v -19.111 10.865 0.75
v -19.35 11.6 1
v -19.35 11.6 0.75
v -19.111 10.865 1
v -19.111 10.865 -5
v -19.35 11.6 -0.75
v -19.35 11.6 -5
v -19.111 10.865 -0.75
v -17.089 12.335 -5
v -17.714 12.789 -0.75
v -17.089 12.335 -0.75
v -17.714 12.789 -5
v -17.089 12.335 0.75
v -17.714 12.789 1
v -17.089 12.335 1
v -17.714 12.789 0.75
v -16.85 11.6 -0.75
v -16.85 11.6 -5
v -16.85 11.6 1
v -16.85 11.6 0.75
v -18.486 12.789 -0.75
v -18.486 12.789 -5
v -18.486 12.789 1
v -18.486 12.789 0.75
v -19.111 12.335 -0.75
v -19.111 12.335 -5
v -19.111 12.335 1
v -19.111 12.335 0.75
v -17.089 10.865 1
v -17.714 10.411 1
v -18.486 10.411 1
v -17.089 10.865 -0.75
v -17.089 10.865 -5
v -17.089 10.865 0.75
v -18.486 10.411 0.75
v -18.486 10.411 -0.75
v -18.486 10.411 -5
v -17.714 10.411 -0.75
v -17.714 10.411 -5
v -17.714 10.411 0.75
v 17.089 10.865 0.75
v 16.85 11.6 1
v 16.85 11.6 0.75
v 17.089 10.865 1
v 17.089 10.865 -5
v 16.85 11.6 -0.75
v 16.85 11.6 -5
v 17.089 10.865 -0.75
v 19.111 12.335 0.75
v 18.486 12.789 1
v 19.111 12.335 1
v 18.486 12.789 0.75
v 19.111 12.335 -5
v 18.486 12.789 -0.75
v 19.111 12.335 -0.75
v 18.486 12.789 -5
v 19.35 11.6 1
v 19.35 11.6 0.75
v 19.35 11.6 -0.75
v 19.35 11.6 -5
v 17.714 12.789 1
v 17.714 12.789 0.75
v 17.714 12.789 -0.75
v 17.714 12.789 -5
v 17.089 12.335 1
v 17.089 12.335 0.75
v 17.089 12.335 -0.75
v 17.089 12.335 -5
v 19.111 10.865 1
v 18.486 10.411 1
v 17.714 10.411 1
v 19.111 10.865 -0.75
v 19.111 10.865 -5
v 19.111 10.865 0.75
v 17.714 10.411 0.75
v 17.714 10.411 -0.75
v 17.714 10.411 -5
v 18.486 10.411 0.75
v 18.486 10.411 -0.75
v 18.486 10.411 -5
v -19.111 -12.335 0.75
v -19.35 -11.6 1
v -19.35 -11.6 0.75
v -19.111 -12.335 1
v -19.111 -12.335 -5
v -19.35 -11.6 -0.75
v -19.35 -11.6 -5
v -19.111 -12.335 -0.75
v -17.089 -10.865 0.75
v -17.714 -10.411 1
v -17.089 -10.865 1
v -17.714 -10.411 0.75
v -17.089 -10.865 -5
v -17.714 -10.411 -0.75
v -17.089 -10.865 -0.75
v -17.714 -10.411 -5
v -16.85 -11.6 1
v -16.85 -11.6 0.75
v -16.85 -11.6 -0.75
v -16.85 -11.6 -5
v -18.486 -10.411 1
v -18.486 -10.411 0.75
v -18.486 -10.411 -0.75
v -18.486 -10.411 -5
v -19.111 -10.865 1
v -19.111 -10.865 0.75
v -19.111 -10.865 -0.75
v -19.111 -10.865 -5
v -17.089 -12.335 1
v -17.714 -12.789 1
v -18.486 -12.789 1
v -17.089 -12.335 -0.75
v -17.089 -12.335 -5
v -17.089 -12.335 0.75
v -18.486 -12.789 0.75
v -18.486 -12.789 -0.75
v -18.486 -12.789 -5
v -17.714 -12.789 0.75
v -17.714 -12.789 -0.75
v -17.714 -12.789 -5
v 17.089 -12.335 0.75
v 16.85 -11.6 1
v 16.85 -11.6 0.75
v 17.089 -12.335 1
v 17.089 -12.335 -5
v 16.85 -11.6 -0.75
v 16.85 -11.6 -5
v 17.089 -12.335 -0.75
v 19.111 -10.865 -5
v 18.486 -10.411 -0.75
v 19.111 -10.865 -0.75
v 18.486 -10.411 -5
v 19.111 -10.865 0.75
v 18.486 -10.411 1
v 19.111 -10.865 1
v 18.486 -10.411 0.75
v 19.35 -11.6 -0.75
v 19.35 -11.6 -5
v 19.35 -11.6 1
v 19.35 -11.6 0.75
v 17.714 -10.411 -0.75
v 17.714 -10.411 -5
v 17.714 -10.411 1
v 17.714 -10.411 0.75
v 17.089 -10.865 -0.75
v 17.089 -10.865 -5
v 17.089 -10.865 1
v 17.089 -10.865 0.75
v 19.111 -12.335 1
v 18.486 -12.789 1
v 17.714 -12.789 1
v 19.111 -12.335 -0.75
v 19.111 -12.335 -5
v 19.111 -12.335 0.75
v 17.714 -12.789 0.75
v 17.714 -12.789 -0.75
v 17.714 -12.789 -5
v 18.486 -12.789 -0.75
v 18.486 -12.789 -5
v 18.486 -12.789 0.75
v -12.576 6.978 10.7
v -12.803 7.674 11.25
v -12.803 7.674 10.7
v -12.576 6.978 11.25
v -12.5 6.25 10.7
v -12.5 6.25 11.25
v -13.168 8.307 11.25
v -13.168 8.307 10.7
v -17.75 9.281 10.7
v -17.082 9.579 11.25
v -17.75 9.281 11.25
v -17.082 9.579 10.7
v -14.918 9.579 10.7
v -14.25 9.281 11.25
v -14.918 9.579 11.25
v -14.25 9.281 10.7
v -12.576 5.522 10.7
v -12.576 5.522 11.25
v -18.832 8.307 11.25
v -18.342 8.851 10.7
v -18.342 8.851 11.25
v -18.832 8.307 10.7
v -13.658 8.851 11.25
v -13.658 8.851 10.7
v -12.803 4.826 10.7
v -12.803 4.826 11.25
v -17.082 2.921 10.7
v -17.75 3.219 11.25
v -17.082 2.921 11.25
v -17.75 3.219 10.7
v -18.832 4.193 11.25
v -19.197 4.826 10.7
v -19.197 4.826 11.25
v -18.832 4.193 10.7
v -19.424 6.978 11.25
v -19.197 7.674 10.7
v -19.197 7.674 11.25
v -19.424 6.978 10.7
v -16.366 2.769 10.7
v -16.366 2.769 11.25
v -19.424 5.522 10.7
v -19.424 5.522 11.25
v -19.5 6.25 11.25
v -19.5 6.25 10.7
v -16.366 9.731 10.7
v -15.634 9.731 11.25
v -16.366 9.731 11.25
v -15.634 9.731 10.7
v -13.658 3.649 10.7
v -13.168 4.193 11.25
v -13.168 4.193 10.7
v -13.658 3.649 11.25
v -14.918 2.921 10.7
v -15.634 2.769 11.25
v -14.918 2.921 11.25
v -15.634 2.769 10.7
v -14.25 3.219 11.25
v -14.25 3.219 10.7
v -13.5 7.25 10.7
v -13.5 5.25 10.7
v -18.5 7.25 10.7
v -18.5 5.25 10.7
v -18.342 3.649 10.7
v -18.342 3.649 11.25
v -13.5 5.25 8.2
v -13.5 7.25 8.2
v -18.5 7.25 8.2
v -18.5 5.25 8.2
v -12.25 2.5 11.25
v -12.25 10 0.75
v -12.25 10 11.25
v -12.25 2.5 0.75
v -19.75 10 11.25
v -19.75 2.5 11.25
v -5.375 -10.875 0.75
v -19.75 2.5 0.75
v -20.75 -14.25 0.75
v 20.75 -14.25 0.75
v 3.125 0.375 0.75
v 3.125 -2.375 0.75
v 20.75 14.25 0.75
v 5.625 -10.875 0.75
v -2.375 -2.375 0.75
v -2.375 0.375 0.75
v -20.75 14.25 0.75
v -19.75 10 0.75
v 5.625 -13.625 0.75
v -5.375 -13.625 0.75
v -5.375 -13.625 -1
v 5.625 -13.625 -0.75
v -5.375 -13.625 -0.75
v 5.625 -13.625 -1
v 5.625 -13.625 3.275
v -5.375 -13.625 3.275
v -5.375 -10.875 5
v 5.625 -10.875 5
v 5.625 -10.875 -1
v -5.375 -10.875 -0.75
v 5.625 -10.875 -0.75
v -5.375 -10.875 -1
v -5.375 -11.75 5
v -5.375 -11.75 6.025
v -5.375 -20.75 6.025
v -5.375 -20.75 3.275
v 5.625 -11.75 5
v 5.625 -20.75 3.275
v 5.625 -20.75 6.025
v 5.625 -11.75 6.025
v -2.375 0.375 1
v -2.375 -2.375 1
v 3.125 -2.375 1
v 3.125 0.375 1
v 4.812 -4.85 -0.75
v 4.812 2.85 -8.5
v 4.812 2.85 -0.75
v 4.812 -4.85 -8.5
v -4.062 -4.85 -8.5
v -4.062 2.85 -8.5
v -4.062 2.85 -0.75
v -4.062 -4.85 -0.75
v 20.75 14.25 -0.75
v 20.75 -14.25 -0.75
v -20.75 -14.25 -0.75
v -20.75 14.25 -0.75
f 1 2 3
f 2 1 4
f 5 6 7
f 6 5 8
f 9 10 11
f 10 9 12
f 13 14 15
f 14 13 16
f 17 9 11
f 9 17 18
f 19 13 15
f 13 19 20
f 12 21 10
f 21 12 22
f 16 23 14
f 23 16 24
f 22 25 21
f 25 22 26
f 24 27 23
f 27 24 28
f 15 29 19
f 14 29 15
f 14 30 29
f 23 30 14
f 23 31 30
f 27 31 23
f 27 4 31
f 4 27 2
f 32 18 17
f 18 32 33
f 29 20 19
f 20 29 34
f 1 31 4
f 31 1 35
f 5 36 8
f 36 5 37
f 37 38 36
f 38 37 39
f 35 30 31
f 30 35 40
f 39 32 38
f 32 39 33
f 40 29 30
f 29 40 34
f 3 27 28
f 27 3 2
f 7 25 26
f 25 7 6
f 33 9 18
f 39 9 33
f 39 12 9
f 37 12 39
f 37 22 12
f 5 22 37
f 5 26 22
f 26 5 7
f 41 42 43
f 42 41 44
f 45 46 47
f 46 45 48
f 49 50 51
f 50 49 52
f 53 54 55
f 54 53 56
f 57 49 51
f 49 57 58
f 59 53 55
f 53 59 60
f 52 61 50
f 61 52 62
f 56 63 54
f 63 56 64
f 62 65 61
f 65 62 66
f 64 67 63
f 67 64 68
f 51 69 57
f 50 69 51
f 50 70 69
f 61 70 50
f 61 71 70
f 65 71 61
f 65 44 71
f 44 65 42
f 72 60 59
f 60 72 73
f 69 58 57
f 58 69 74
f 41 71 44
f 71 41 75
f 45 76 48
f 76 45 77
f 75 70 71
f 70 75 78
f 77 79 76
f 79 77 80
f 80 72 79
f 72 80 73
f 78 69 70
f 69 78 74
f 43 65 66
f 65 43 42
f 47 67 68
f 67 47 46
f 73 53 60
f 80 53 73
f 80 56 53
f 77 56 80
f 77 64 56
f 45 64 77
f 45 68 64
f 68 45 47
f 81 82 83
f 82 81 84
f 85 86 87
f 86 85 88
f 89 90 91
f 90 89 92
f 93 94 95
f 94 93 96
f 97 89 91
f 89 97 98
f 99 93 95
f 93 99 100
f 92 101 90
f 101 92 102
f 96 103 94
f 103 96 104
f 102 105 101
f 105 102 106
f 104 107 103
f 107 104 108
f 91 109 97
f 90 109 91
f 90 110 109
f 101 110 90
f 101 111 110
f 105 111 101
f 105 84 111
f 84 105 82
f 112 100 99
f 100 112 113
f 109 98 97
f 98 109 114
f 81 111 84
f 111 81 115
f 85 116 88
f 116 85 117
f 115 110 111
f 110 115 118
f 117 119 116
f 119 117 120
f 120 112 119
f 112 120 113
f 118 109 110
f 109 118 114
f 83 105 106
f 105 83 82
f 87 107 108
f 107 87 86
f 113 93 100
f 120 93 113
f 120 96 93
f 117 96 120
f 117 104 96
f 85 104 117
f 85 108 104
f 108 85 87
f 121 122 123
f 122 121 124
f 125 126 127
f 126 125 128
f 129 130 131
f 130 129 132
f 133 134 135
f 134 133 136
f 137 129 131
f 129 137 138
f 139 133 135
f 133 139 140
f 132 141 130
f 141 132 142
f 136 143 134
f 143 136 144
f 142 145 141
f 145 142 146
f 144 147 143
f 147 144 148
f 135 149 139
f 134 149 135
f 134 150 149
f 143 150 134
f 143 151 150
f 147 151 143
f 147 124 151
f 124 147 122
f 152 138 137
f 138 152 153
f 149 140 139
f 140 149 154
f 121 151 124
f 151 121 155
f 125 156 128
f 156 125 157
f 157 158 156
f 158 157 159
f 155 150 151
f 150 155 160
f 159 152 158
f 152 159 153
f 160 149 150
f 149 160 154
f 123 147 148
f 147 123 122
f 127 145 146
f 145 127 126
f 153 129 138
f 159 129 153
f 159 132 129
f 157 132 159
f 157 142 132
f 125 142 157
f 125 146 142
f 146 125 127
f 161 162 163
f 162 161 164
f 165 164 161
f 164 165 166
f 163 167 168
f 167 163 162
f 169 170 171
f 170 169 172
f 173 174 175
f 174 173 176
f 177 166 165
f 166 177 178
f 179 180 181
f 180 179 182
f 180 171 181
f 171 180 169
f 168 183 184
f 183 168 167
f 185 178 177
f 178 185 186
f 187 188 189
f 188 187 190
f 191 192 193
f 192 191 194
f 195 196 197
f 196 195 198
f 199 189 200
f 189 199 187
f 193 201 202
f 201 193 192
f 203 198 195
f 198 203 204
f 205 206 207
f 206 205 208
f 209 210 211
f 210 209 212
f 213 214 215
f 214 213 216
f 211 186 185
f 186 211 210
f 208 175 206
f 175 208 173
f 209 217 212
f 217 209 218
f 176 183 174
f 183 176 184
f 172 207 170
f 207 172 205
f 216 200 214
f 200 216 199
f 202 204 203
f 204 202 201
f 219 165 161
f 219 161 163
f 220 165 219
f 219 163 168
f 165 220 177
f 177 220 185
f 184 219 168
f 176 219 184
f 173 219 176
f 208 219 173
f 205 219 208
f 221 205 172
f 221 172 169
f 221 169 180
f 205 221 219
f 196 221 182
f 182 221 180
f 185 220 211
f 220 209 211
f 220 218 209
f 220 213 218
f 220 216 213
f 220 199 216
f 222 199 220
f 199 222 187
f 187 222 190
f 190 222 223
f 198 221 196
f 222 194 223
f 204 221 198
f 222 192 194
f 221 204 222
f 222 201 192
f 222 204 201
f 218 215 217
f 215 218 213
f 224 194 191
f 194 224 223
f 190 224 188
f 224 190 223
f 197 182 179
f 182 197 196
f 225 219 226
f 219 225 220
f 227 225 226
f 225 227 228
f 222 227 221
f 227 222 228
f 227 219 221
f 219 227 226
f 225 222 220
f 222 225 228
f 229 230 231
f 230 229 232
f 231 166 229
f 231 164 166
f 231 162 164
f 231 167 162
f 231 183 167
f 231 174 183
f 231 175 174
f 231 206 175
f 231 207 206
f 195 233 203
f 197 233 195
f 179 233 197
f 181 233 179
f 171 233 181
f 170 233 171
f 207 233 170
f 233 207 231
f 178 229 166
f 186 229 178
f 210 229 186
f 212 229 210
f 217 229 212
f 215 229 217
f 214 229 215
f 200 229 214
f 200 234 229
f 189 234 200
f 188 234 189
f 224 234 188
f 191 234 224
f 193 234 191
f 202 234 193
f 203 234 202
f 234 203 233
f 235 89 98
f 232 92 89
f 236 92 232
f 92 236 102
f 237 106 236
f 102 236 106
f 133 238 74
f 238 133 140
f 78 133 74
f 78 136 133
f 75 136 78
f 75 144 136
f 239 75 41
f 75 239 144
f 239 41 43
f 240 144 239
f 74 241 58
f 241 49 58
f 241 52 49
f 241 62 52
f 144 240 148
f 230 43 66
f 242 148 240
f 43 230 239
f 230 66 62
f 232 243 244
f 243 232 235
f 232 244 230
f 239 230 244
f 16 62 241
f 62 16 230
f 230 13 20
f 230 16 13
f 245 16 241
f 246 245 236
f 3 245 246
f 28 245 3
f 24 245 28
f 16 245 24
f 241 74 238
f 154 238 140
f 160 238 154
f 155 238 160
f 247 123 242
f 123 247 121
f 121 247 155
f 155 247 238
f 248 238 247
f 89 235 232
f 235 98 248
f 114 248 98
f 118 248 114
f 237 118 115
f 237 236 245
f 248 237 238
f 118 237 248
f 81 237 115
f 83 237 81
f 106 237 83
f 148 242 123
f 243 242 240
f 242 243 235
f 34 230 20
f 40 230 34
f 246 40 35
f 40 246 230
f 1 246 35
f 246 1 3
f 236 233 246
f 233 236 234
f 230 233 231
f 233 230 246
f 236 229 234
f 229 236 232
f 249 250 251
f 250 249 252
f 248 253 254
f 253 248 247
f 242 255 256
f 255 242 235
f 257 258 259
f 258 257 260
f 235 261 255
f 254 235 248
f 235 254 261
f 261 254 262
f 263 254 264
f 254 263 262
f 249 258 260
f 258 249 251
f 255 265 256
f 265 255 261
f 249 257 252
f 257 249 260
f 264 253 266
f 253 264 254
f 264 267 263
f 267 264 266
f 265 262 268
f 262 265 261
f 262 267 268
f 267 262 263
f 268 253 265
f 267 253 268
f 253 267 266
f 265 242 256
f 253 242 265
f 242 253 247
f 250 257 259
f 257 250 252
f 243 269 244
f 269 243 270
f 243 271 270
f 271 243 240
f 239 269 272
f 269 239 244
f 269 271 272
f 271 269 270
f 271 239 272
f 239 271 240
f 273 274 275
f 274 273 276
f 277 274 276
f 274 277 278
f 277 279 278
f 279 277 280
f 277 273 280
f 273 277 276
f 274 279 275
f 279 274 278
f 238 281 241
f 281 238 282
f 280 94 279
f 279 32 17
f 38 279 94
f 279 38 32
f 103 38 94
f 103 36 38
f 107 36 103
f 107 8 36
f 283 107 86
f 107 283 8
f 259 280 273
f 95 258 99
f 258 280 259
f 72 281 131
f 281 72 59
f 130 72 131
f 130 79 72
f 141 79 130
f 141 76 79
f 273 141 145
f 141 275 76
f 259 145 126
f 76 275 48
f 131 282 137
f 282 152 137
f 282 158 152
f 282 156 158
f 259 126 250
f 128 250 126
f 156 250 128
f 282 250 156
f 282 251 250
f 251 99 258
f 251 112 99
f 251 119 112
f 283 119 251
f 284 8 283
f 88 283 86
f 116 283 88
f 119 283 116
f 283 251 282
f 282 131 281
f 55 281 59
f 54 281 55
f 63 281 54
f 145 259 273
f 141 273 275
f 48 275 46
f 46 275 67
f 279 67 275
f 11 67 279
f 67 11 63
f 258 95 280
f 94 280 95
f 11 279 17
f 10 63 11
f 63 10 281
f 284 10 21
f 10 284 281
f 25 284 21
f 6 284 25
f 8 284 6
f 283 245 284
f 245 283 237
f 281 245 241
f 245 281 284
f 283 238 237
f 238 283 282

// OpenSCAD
// file: pcb_connector.scad
pin(len = 8, angle = 90, mask = 0);
translate([-10,0,0])pinrow(num = 4,len = 8, angle = 90, mask = 0);

translate([12,0,0])xh2_54f(num = 4, mask = 0);
translate([0,20,0])
{
pin(len = 8, angle = 90, mask = 1);
translate([-10,0,0])pinrow(num = 4,len = 8, angle = 90, mask = 1);

translate([12,0,0])xh2_54f(num = 4, mask = 1);
}
module pin(len = 7, angle = 0, mask = 0)
{
  pins = (mask == 0)? 0.70: 2.75;
  cube([2.75,2.75,3], center = true); //plastic cube
  cube([pins,pins,6], center = true); //transverse
  translate([(angle != 0)?len/2*sin(angle):0,0,(angle != 0)?len/2*cos(angle)-0.35+3:3])
    rotate([0,angle,0])
    cube([pins,pins,len+mask], center = true); //transverse

}

module pinrow(num = 4,len = 7, angle = 0, mask = 0)
{
  for(y =  [0:num-1])
    translate([0,y*2.75,0])pin(len,angle, mask = mask);
}
module xh2_54f(num = 4, mask = 0)
{
  for(x =  [0:num-1])
    translate([x*2.75,0,0])pin(len = 3.5, mask = mask);
  translate([num*2.75/2-2.75/2,0,2+mask/2])
  {
    difference()
    {
      cube([(num+0.5)*2.75+2, 5.7+2,7+mask], center = true);
      if(mask == 0)
      union()
      {
        translate([0,0,3])
          cube([(num+0.5)*2.75, 5.7,7], center = true);
        translate([0,-2,3])
          cube([4, 5.7,7], center = true);
      }
    }
  }
}
// main file
use <pcb_connector.scad>

function jsnhr04size()=  [41.5, 28.5,2.5,2.65];

jsnhr04controler(mask = 1);
module jsnhr04controler(mask = 0)
{
 data = jsnhr04size();
  breite = data[0];
  hoehe = data[1];
  holed = data[2];
  holeOff = data[3];

  holex = breite/2-holeOff;
  holey = hoehe/2-holeOff;

  difference()
  {
    cube([breite,hoehe,1.5], center = true);
    if(mask == 0)
      for(i = [0:3]) 
        translate([(i%2 == 0)?-holex:holex, (i>1) ? -holey:holey, -2])
          cylinder(d= holed, h = 5, $fn = 10);
  }
  if(mask != 0)
    for(i = [0:3]) 
      translate([(i%2 == 0)?-holex:holex, (i>1) ? -holey:holey, -2-(5+mask)/2])
        cylinder(d= holed, h = 5+mask, $fn = 10);
  translate([-breite/2+7.5/2+1, hoehe/2-8,9.5/2+mask/2+0.75])
  {
    difference()
    {
      cube([7.5,7.5,9.5+mask], center = true);
      union()
      {
        color("blue")
          translate([0,0,4.7]) cylinder(h=1,d= 7, $fn = 30);
        translate([0,0,4.7]) cube([5,2,5], center = true);
      }
    }

  }

  translate([-4,-hoehe/2+2,2]) rotate([0,0,-90])pinrow(num = 4,len = 8, angle = 90, mask = mask);

  color("magenta")
  translate([-1,-1,-2]) rotate([180,0,-00]) xh2_54f(num = 2, mask = mask);
}
module jsnhr04controlerpads(mask = 0, h = 5)
{
 data = jsnhr04size();
  breite = data[0];
  hoehe = data[1];
  holed = data[2]+mask;
  holeOff = data[3];

  holex = breite/2-holeOff;
  holey = hoehe/2-holeOff;

      for(i = [0:3]) 
        translate([(i%2 == 0)?-holex:holex, (i>1) ? -holey:holey, -2])
          cylinder(d= holed, h = h, $fn = 10);
}
